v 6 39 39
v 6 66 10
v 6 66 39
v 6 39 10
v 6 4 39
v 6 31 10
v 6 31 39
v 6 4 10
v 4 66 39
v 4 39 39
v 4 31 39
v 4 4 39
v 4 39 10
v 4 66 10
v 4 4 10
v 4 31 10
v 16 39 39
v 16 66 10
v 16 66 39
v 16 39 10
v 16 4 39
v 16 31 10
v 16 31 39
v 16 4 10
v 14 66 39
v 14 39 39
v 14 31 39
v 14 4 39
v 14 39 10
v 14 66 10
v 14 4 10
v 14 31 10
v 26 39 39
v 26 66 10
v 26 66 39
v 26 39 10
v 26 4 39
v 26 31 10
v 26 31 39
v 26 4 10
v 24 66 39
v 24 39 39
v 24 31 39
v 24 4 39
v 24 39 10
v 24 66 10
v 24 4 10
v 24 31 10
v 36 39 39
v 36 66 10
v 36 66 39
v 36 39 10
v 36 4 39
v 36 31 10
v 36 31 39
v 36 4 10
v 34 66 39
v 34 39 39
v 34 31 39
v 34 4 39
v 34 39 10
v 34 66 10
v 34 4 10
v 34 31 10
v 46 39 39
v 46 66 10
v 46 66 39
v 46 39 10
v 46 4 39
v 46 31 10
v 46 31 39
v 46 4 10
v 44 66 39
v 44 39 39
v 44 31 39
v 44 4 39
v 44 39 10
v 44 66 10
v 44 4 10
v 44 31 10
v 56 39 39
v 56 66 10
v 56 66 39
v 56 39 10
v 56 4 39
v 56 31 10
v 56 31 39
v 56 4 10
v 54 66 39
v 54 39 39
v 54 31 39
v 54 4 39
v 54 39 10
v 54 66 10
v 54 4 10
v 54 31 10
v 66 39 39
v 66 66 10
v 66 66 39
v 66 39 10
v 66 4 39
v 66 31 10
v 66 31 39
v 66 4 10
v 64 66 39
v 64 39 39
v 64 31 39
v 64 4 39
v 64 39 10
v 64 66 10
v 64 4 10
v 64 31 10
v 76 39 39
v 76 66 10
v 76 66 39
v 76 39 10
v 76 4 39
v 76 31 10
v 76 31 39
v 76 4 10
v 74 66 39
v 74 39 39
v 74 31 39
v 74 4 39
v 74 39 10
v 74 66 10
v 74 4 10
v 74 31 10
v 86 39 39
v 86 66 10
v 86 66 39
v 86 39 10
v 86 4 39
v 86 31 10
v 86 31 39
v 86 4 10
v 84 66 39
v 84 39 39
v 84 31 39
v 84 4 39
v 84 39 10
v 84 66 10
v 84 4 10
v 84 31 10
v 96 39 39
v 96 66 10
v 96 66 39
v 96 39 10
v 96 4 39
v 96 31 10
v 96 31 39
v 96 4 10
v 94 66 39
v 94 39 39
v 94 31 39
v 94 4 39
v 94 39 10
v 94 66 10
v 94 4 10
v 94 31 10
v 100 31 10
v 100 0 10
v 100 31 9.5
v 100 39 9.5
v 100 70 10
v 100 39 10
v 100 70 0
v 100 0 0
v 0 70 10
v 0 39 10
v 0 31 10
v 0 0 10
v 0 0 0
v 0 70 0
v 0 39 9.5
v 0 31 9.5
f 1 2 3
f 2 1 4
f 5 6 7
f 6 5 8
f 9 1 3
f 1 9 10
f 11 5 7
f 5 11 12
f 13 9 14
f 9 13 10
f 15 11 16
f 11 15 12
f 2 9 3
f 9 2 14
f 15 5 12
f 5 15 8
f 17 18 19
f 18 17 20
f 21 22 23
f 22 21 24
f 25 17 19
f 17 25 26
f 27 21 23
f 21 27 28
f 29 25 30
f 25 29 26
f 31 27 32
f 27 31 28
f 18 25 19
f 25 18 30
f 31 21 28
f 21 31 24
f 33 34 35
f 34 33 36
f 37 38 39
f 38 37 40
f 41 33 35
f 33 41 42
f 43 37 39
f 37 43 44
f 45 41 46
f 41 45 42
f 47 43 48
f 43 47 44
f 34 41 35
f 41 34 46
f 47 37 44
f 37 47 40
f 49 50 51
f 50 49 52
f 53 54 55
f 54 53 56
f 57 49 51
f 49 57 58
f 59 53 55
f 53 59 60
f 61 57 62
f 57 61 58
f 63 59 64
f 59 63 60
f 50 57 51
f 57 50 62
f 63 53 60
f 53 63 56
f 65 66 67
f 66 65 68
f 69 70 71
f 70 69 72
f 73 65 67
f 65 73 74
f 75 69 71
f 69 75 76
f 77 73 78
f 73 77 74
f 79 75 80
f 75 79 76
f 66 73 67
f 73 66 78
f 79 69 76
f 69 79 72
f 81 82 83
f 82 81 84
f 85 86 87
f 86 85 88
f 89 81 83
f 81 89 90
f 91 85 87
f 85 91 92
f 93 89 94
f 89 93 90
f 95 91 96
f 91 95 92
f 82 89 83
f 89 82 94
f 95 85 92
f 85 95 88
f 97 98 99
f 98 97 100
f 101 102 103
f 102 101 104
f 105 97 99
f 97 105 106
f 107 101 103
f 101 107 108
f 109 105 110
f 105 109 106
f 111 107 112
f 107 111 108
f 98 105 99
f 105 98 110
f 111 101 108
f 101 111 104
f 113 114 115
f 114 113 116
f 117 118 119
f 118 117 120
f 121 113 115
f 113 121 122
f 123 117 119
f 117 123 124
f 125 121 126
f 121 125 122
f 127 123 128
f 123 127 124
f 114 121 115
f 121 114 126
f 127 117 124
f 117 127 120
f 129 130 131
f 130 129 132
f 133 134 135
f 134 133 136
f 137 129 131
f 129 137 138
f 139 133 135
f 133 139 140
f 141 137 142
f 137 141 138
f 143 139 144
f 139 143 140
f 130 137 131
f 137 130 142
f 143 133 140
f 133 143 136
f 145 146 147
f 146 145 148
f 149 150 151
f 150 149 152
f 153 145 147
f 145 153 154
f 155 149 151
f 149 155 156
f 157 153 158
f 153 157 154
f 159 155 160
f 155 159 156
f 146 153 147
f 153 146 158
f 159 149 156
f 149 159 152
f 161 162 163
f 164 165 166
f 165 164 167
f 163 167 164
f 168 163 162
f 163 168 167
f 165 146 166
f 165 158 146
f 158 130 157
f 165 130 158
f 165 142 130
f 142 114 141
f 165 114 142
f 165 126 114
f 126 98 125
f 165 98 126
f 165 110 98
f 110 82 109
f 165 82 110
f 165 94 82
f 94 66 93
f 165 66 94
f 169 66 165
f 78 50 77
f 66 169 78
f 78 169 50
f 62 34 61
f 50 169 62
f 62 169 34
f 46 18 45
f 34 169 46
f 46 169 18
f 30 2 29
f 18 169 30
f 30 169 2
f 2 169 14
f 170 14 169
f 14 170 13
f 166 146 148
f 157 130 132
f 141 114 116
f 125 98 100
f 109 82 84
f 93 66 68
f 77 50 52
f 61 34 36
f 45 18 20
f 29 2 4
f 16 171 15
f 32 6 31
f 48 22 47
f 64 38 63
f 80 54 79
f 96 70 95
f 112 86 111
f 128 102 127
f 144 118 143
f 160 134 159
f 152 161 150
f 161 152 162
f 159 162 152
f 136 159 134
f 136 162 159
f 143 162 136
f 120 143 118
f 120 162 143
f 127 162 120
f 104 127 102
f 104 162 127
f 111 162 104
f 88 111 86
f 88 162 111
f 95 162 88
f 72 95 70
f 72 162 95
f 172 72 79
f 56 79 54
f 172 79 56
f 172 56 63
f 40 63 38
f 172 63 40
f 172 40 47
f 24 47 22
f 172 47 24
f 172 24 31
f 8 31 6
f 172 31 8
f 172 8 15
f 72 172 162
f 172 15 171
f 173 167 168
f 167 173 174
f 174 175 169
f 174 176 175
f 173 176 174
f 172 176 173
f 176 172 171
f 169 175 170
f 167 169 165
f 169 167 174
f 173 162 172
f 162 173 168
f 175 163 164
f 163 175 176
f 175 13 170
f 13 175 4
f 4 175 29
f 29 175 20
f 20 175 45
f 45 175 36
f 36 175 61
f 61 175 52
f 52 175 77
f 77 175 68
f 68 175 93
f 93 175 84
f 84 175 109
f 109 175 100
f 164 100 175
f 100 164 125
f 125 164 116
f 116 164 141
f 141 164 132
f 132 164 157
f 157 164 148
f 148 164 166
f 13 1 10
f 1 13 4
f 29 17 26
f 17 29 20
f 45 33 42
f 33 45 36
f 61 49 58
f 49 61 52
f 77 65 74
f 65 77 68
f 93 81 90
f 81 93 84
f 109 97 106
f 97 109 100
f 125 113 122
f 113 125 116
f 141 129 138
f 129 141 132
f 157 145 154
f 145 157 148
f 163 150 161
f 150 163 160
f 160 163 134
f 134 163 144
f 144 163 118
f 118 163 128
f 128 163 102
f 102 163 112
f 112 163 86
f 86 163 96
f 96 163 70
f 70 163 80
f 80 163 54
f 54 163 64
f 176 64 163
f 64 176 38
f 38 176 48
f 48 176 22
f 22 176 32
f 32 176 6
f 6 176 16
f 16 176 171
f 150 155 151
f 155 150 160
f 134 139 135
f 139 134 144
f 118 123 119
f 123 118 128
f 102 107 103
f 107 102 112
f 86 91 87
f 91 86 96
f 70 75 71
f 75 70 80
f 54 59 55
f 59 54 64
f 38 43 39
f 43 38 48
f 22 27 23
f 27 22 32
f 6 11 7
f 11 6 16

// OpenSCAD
$fn = 32;

// ----------------------------------------------------------------------
// Heatsink: slotted fin block
// ----------------------------------------------------------------------

// --- parameters (mm) ---
base_l = 100;             // base length, X
base_w = 70;              // base width, Y
base_t = 10;              // base plate thickness
fin_h = 30;               // fin height above the base
fin_t = 2;                // fin thickness
edge = 4;                 // margin from the base ends
pitch = 10;               // fin pitch
slot_w = 8;               // central slot width, Y
fit_tol = 0.02;           // tolerance for press fits, mm
free_tol = 0.2;           // tolerance for clearance fits, mm

n_fins = floor((base_l - 2 * edge - fin_t) / pitch) + 1;  // fin count
total_h = base_t + fin_h - 1;  // overall height

difference() {
union() {
  cube([base_l, base_w, base_t]);
  for (i = [0 : n_fins - 1])
    translate([edge + i * pitch, edge, base_t - 1])
      cube([fin_t, base_w - 2 * edge, fin_h]);
}
  translate([-1, base_w / 2 - slot_w / 2, base_t - 0.5])
    cube([base_l + 2, slot_w, fin_h + 2]);
}
